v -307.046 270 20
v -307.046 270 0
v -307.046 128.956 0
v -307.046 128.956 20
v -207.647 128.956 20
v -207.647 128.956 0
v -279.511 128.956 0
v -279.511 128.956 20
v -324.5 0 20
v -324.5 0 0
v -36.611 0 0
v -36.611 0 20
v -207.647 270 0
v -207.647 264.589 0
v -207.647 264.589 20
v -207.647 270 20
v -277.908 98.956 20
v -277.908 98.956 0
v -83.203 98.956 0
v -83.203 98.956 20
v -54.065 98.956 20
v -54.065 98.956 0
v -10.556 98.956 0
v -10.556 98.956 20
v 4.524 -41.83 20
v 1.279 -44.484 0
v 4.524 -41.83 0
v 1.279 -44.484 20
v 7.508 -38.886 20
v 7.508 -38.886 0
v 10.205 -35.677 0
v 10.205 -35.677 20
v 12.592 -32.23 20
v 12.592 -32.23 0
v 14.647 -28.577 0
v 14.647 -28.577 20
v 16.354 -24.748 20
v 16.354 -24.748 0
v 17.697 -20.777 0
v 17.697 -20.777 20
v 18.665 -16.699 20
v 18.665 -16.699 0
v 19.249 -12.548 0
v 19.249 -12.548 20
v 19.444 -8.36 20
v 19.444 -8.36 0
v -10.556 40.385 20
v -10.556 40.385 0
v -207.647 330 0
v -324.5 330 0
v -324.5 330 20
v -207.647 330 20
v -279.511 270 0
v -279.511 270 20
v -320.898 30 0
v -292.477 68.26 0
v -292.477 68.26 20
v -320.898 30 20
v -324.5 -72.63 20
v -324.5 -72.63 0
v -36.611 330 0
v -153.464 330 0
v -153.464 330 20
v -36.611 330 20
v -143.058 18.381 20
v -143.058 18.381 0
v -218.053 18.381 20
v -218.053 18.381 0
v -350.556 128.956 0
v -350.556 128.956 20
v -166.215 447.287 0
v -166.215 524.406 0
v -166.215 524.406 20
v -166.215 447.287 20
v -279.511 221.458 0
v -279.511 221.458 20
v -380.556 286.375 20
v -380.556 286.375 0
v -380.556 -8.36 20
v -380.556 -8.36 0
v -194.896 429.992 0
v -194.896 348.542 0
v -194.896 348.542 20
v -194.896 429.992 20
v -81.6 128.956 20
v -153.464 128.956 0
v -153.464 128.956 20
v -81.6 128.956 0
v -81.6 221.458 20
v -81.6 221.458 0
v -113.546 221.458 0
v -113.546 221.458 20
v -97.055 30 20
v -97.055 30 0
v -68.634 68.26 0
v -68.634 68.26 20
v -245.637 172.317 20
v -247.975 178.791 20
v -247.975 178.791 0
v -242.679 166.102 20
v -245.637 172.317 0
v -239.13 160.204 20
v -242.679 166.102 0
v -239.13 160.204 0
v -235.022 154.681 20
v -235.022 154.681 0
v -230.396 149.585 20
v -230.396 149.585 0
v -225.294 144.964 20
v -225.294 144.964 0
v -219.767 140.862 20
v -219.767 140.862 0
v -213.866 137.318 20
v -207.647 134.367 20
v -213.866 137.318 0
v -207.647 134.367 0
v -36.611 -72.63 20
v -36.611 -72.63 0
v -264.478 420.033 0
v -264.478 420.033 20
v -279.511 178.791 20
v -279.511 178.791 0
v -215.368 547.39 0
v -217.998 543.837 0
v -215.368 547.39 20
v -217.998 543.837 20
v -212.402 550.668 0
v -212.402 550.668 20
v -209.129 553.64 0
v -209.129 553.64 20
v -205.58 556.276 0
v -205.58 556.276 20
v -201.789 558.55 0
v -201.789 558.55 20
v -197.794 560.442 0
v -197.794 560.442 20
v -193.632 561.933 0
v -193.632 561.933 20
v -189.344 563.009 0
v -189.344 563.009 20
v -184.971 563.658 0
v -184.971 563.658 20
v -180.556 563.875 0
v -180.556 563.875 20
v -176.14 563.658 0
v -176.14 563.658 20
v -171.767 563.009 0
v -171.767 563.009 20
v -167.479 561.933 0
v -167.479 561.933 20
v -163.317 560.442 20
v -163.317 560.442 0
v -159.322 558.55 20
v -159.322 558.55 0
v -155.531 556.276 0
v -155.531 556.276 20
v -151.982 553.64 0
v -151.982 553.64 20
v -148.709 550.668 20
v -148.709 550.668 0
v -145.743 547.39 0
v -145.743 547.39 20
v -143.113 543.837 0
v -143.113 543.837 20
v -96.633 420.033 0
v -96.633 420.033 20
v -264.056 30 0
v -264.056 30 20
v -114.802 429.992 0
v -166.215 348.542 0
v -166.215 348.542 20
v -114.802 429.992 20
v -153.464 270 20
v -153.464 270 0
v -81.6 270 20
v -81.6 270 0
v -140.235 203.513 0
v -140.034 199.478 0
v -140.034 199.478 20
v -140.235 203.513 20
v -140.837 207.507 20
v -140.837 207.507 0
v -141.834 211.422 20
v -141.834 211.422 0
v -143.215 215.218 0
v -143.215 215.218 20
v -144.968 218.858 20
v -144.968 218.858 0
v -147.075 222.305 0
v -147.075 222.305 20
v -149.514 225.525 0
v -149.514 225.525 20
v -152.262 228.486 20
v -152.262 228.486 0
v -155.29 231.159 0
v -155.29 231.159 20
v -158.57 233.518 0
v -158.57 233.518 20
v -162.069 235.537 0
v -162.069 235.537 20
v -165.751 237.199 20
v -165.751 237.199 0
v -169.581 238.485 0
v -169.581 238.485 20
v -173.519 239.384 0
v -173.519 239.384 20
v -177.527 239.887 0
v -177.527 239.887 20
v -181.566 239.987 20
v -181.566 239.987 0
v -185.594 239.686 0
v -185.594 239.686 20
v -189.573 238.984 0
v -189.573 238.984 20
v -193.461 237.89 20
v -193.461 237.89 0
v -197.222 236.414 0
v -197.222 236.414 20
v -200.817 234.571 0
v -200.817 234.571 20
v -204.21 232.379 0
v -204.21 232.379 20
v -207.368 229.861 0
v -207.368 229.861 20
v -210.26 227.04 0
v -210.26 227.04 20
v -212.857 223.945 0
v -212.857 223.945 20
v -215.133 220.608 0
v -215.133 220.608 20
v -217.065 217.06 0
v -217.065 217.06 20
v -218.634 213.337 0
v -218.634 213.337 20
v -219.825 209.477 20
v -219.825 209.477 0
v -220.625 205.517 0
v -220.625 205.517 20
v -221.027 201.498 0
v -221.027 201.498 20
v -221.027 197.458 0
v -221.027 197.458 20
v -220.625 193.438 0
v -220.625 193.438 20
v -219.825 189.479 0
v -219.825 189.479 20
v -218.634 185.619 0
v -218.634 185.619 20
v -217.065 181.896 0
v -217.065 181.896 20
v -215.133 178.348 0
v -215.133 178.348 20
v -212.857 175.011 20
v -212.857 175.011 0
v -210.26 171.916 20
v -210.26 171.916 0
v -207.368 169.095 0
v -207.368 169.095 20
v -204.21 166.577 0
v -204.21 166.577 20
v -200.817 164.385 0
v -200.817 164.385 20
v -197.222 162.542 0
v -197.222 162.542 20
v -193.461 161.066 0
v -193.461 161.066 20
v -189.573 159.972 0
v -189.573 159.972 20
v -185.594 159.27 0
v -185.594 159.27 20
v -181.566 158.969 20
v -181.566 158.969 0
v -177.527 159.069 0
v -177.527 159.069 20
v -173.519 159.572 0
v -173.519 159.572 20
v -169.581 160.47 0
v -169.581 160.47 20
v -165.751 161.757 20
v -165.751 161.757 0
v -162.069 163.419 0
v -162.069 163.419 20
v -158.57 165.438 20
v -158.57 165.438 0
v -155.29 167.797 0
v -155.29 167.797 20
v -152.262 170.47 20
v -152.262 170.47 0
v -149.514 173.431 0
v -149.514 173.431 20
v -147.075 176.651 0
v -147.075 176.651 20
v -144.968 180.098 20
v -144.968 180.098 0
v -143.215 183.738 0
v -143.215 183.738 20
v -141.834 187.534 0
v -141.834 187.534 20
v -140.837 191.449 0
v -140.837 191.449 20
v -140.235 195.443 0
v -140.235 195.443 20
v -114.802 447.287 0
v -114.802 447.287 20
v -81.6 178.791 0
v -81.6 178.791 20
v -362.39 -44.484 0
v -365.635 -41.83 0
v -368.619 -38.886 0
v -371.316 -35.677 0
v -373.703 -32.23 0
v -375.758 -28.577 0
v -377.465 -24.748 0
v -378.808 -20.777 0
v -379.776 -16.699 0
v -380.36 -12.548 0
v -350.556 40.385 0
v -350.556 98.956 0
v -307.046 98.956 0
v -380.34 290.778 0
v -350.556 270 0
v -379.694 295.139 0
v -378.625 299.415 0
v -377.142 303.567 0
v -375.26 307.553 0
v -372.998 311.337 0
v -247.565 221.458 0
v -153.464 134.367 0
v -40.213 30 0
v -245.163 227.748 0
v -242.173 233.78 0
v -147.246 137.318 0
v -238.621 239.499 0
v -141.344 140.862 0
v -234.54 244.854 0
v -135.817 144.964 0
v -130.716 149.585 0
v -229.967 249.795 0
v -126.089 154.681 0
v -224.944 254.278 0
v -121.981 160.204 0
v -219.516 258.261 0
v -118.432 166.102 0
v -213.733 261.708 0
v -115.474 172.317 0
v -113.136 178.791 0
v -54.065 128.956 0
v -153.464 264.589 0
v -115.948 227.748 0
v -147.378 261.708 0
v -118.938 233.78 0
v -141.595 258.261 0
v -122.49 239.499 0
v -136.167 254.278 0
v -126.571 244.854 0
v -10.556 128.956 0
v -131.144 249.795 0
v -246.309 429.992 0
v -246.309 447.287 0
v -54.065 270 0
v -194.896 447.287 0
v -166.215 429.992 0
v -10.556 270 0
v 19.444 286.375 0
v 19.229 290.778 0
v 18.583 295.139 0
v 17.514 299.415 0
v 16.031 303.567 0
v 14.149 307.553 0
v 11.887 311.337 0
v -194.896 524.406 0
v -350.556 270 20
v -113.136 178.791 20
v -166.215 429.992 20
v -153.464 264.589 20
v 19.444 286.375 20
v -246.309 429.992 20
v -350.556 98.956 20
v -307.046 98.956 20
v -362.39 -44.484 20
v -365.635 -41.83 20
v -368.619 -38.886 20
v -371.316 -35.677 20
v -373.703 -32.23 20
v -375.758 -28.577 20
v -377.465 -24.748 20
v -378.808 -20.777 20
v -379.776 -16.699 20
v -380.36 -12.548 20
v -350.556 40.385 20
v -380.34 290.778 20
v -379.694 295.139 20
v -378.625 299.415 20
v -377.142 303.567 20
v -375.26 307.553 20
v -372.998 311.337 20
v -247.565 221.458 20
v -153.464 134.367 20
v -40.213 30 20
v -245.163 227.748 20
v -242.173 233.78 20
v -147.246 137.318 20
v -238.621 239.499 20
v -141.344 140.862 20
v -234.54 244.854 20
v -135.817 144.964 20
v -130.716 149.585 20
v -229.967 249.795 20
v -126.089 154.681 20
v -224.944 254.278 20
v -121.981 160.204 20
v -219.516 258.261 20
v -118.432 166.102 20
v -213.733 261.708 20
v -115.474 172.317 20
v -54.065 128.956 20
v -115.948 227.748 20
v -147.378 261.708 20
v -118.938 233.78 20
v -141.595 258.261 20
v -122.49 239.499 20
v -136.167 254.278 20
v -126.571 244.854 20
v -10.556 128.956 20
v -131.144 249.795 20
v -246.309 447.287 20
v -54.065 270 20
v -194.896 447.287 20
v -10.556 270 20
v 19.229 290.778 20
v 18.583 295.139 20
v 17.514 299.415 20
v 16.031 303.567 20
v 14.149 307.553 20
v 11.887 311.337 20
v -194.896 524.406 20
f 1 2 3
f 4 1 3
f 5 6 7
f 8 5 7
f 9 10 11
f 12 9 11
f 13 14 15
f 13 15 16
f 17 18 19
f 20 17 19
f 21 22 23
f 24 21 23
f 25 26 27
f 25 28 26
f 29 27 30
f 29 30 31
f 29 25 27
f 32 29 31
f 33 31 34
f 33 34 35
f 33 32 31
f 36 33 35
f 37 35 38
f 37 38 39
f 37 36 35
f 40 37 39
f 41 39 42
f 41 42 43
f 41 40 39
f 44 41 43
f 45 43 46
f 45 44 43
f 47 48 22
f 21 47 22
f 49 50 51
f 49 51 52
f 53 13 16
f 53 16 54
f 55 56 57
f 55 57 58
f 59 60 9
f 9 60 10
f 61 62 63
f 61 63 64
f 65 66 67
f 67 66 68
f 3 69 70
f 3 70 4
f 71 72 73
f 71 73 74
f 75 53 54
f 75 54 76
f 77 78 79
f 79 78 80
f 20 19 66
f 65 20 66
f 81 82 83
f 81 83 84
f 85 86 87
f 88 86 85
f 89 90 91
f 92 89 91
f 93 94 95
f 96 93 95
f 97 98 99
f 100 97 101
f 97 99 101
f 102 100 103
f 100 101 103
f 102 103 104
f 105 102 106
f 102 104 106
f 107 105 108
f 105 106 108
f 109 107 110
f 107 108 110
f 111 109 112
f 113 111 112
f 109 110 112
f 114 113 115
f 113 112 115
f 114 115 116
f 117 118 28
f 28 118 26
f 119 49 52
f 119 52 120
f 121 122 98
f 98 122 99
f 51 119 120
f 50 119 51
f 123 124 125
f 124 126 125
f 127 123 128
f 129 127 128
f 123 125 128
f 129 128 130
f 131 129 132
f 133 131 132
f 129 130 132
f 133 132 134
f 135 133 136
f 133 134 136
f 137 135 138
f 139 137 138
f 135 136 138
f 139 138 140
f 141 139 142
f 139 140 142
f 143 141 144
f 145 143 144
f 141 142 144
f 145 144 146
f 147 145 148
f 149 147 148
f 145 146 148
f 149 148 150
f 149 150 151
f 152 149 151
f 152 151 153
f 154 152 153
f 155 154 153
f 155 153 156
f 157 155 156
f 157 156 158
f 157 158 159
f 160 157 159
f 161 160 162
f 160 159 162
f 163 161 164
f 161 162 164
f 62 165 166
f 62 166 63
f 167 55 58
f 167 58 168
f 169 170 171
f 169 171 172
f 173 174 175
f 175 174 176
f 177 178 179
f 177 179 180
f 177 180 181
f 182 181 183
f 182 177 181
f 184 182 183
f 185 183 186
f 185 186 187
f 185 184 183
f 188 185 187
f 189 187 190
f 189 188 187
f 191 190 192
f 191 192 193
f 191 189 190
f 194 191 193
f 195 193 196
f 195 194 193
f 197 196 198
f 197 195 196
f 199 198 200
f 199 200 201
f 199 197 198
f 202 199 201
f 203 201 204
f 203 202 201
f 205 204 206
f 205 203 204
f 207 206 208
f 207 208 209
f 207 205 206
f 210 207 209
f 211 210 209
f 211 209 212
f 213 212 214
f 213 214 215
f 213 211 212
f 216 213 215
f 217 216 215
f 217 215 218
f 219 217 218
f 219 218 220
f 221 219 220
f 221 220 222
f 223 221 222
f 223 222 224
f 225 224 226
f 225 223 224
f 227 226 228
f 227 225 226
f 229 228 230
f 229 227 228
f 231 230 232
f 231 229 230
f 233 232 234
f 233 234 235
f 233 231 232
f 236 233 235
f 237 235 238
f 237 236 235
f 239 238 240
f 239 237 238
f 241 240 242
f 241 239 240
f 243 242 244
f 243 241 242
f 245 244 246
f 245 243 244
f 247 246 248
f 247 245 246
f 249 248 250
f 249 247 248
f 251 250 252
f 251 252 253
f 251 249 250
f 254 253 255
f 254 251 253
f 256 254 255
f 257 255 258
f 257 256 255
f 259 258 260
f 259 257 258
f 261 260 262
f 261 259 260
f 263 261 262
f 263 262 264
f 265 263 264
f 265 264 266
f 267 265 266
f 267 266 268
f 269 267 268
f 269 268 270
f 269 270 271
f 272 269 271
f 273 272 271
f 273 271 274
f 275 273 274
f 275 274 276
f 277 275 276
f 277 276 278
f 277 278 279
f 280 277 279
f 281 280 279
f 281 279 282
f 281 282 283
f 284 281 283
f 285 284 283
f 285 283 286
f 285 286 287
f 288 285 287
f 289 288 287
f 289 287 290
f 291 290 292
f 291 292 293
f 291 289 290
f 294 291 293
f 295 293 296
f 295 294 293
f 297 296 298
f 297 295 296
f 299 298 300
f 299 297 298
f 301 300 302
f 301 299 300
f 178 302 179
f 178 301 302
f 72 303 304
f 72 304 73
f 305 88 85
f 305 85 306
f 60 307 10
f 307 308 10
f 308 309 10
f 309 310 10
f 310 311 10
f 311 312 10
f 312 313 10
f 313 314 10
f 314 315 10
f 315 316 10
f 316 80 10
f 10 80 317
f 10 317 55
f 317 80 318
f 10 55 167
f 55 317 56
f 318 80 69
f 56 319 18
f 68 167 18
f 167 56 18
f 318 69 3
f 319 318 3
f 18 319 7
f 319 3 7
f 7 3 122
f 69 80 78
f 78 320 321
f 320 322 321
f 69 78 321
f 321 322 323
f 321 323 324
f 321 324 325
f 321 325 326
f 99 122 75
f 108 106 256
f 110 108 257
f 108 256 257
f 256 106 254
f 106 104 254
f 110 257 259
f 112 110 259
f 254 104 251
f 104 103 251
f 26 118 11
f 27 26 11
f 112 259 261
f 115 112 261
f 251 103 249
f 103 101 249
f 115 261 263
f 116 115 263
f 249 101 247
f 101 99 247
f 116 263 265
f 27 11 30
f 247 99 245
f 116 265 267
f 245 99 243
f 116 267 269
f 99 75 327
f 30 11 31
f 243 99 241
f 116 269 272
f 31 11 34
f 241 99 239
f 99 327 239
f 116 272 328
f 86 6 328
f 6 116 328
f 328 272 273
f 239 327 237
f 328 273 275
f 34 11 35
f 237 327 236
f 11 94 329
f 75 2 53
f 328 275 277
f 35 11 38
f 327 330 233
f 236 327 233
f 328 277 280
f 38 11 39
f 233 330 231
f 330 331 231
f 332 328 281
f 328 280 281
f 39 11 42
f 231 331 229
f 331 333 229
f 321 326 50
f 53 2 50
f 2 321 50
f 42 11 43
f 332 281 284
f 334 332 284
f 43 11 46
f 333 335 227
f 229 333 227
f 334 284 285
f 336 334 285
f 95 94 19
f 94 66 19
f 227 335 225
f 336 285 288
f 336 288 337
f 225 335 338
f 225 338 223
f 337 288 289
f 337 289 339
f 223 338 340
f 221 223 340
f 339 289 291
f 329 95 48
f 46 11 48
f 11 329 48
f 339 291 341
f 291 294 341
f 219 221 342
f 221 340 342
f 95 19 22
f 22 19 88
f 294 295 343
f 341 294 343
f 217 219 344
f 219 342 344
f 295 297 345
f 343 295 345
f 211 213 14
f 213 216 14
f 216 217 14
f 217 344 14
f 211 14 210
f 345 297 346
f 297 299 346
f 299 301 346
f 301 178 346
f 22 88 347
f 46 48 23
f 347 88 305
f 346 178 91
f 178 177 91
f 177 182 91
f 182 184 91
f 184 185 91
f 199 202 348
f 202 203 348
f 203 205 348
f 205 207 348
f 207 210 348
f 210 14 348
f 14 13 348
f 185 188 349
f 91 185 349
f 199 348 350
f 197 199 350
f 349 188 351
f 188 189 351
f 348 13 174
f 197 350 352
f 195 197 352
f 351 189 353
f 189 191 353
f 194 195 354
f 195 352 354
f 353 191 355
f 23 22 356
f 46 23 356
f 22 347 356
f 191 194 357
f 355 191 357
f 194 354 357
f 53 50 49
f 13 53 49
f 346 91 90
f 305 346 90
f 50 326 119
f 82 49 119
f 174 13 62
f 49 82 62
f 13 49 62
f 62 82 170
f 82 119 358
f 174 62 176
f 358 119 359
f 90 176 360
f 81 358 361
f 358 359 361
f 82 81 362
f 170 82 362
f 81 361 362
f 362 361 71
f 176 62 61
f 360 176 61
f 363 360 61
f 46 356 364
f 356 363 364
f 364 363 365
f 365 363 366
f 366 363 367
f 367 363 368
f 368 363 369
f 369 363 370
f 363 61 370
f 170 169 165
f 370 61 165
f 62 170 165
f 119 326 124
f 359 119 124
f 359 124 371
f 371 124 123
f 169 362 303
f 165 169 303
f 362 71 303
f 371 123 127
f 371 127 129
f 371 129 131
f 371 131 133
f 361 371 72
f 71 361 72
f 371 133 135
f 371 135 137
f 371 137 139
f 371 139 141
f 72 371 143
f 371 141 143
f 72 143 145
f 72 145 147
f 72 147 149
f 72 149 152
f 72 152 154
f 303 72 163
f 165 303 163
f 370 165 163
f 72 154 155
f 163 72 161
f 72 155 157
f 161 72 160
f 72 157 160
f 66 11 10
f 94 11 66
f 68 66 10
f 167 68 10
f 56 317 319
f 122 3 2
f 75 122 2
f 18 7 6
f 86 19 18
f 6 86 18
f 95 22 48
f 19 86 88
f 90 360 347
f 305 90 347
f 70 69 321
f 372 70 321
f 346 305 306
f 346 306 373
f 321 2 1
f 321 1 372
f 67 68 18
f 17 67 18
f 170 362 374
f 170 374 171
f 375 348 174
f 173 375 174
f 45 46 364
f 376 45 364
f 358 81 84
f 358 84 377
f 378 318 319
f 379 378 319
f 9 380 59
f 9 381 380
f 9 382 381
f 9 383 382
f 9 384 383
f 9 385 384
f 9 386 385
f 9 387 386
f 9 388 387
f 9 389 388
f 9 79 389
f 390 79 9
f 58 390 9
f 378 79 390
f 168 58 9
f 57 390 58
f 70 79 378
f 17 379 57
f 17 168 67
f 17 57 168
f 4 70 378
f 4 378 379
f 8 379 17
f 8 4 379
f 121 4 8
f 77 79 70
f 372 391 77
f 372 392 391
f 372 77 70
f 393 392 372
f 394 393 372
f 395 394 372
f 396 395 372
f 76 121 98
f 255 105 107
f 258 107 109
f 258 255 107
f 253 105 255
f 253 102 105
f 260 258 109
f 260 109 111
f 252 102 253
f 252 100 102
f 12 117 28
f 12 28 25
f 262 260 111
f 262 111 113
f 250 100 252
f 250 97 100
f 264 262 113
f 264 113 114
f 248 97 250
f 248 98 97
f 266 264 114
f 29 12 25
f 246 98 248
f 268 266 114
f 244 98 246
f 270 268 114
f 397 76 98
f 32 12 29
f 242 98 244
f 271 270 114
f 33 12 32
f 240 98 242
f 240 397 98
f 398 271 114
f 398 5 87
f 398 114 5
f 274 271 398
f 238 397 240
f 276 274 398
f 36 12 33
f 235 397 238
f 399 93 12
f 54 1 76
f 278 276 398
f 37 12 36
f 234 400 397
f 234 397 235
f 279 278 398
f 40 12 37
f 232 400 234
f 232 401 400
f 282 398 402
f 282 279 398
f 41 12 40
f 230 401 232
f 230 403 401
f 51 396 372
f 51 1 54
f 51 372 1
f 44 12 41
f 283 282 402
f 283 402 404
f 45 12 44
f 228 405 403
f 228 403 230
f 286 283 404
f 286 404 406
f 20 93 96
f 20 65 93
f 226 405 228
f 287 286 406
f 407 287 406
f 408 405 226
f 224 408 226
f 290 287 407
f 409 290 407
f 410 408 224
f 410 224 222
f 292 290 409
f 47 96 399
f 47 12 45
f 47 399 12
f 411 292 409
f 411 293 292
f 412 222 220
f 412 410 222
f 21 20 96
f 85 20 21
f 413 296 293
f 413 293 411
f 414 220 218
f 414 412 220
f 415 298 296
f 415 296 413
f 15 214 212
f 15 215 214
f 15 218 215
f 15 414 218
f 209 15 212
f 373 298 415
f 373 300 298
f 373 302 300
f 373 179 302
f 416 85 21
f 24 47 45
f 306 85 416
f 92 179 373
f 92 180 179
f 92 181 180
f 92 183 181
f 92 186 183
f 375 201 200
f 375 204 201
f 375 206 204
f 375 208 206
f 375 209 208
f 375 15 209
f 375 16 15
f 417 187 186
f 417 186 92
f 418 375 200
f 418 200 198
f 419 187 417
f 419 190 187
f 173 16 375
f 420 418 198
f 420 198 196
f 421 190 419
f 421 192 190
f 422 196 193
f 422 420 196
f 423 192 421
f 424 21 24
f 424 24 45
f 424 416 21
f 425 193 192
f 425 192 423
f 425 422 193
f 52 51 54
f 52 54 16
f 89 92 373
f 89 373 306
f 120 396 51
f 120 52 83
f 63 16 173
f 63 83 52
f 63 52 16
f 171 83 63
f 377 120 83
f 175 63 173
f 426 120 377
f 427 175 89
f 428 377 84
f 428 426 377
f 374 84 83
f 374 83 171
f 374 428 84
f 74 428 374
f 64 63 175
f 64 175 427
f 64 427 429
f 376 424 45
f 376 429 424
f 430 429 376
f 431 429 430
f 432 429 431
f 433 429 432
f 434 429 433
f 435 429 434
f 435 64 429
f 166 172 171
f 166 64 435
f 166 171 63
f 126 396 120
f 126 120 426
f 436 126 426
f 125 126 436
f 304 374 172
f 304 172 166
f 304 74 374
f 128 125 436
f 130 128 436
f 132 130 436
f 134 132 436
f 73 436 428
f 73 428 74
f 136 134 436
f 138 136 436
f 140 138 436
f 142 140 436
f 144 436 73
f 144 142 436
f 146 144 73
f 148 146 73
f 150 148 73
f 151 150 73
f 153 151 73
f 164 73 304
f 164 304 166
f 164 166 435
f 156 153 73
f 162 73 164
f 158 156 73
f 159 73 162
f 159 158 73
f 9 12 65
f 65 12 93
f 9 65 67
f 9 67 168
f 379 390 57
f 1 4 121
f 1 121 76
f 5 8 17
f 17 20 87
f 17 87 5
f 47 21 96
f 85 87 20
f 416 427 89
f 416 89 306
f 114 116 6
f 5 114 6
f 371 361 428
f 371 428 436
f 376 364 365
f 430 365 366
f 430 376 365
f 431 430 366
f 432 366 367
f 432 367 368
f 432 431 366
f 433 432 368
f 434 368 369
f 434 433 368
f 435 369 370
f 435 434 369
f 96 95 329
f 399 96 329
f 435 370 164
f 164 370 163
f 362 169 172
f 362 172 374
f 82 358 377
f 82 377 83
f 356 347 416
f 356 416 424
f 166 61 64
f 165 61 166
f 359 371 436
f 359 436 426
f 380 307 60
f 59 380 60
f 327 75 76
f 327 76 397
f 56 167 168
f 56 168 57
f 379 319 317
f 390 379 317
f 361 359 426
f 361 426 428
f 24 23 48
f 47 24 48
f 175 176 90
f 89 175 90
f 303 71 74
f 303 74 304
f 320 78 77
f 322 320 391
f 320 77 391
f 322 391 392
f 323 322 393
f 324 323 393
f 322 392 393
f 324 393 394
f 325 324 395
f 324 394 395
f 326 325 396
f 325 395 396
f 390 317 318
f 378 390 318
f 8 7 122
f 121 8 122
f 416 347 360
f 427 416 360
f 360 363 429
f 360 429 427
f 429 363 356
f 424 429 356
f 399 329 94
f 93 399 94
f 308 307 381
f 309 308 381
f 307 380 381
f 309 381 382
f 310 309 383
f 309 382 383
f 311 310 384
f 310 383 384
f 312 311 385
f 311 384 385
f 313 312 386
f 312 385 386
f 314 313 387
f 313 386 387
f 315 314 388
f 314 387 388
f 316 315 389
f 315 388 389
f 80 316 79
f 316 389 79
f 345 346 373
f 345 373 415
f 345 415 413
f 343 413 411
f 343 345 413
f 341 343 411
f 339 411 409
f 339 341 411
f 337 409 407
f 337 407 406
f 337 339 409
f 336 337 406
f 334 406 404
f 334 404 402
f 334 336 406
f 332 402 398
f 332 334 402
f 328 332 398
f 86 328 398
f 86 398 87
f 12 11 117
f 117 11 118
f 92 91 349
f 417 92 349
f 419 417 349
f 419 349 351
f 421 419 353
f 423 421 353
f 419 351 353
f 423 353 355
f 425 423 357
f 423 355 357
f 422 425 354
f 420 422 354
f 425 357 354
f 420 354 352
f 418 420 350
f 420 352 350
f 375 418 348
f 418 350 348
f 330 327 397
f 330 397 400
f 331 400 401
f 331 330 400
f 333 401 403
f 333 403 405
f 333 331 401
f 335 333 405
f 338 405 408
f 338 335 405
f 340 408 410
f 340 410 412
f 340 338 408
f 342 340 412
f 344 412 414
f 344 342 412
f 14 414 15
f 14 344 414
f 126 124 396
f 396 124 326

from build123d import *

# Parameters (mm, degrees)
SKETCH1_R           = 40.52203667
BOSS_EXTRUDE1_DEPTH = 20
FILLET1_R           = 45


with BuildPart() as part:
    # Sketch1 → Boss-Extrude1 (new body)
    with BuildSketch(Plane.XY):
        Polygon((-324.500042801, 0), (-36.61106831, 0), (-36.61106831, -72.630227613), (19.444444444, -30.98937664), (19.444444444, 0), (19.444444444, 300), (-180.555555556, 600), (-380.555555556, 300), (-380.555555556, 0), (-380.555555556, -30.98937664), (-324.500042801, -72.630227613), align=None)
        with Locations((-180.555555556, 199.47796333)):
            Circle(SKETCH1_R, mode=Mode.SUBTRACT)
        Polygon((-350.555555556, 98.955926659), (-307.046121917, 98.955926659), (-350.555555556, 40.384990781), align=None, mode=Mode.SUBTRACT)
        Polygon((-218.052993309, 18.381237109), (-277.907920592, 98.955926659), (-83.203190519, 98.955926659), (-143.058117802, 18.381237109), align=None, mode=Mode.SUBTRACT)
        Polygon((-40.212760909, 30), (-97.055418804, 30), (-68.634089856, 68.259836918), align=None, mode=Mode.SUBTRACT)
        Polygon((-350.555555556, 128.955926659), (-307.046121917, 128.955926659), (-307.046121917, 178.791030317), (-307.046121917, 221.457829656), (-307.046121917, 270), (-350.555555556, 270), (-350.555555556, 221.457829656), (-350.555555556, 178.791030317), align=None, mode=Mode.SUBTRACT)
        Polygon((-194.895952536, 524.406135398), (-246.308768225, 447.286911864), (-194.895952536, 447.286911864), align=None, mode=Mode.SUBTRACT)
        Polygon((-36.61106831, 330), (-96.633315679, 420.033371054), (-153.463987032, 330), align=None, mode=Mode.SUBTRACT)
        Polygon((-324.500042801, 330), (-207.64712408, 330), (-264.477795432, 420.033371054), align=None, mode=Mode.SUBTRACT)
        Polygon((-10.555555556, 40.384990781), (-54.064989194, 98.955926659), (-10.555555556, 98.955926659), align=None, mode=Mode.SUBTRACT)
        Polygon((-10.555555556, 128.955926659), (-10.555555556, 178.791030317), (-10.555555556, 221.457829656), (-10.555555556, 270), (-54.064989194, 270), (-54.064989194, 221.457829656), (-54.064989194, 178.791030317), (-54.064989194, 128.955926659), align=None, mode=Mode.SUBTRACT)
        Polygon((-320.898350202, 30), (-264.055692307, 30), (-292.477021255, 68.259836918), align=None, mode=Mode.SUBTRACT)
        with BuildLine():
            Line((-279.511482215, 270), (-279.511482215, 221.457829656))
            Line((-279.511482215, 221.457829656), (-247.564832021, 221.457829656))
            ThreePointArc((-247.564832021, 221.457829656), (-232.312774166, 247.379403578), (-207.64712408, 264.58867344))
            Line((-207.64712408, 264.58867344), (-207.64712408, 270))
            Line((-207.64712408, 270), (-279.511482215, 270))
        make_face(mode=Mode.SUBTRACT)
        with BuildLine():
            Line((-279.511482215, 128.955926659), (-279.511482215, 178.791030317))
            Line((-279.511482215, 178.791030317), (-247.975200012, 178.791030317))
            ThreePointArc((-247.975200012, 178.791030317), (-232.771073725, 152.076514844), (-207.64712408, 134.367253219))
            Line((-207.64712408, 134.367253219), (-207.64712408, 128.955926659))
            Line((-207.64712408, 128.955926659), (-279.511482215, 128.955926659))
        make_face(mode=Mode.SUBTRACT)
        with BuildLine():
            Line((-153.463987032, 134.367253219), (-153.463987032, 128.955926659))
            Line((-153.463987032, 128.955926659), (-81.599628896, 128.955926659))
            Line((-81.599628896, 128.955926659), (-81.599628896, 178.791030317))
            Line((-81.599628896, 178.791030317), (-113.135911099, 178.791030317))
            ThreePointArc((-113.135911099, 178.791030317), (-128.340037386, 152.076514844), (-153.463987032, 134.367253219))
        make_face(mode=Mode.SUBTRACT)
        with BuildLine():
            Line((-153.463987032, 264.58867344), (-153.463987032, 270))
            Line((-153.463987032, 270), (-81.599628896, 270))
            Line((-81.599628896, 270), (-81.599628896, 221.457829656))
            Line((-81.599628896, 221.457829656), (-113.54627909, 221.457829656))
            ThreePointArc((-113.54627909, 221.457829656), (-128.798336945, 247.379403578), (-153.463987032, 264.58867344))
        make_face(mode=Mode.SUBTRACT)
        Polygon((-114.802342886, 429.992241235), (-166.215158575, 429.992241235), (-166.215158575, 348.542048906), align=None, mode=Mode.SUBTRACT)
        Polygon((-114.802342886, 447.286911864), (-166.215158575, 524.406135398), (-166.215158575, 447.286911864), align=None, mode=Mode.SUBTRACT)
        Polygon((-246.308768225, 429.992241235), (-194.895952536, 348.542048906), (-194.895952536, 429.992241235), align=None, mode=Mode.SUBTRACT)
    extrude(amount=BOSS_EXTRUDE1_DEPTH)

    # Fillet1
    fillet1_edges = [part.edges().sort_by_distance(p)[0] for p in [
        (19.444444444, -30.98937664, 10),
        (-380.555555556, -30.98937664, 10),
        (-380.555555556, 300, 10),
        (-180.555555556, 600, 10),
        (19.444444444, 300, 10),
    ]]
    fillet(fillet1_edges, radius=FILLET1_R)


solid = part.part
